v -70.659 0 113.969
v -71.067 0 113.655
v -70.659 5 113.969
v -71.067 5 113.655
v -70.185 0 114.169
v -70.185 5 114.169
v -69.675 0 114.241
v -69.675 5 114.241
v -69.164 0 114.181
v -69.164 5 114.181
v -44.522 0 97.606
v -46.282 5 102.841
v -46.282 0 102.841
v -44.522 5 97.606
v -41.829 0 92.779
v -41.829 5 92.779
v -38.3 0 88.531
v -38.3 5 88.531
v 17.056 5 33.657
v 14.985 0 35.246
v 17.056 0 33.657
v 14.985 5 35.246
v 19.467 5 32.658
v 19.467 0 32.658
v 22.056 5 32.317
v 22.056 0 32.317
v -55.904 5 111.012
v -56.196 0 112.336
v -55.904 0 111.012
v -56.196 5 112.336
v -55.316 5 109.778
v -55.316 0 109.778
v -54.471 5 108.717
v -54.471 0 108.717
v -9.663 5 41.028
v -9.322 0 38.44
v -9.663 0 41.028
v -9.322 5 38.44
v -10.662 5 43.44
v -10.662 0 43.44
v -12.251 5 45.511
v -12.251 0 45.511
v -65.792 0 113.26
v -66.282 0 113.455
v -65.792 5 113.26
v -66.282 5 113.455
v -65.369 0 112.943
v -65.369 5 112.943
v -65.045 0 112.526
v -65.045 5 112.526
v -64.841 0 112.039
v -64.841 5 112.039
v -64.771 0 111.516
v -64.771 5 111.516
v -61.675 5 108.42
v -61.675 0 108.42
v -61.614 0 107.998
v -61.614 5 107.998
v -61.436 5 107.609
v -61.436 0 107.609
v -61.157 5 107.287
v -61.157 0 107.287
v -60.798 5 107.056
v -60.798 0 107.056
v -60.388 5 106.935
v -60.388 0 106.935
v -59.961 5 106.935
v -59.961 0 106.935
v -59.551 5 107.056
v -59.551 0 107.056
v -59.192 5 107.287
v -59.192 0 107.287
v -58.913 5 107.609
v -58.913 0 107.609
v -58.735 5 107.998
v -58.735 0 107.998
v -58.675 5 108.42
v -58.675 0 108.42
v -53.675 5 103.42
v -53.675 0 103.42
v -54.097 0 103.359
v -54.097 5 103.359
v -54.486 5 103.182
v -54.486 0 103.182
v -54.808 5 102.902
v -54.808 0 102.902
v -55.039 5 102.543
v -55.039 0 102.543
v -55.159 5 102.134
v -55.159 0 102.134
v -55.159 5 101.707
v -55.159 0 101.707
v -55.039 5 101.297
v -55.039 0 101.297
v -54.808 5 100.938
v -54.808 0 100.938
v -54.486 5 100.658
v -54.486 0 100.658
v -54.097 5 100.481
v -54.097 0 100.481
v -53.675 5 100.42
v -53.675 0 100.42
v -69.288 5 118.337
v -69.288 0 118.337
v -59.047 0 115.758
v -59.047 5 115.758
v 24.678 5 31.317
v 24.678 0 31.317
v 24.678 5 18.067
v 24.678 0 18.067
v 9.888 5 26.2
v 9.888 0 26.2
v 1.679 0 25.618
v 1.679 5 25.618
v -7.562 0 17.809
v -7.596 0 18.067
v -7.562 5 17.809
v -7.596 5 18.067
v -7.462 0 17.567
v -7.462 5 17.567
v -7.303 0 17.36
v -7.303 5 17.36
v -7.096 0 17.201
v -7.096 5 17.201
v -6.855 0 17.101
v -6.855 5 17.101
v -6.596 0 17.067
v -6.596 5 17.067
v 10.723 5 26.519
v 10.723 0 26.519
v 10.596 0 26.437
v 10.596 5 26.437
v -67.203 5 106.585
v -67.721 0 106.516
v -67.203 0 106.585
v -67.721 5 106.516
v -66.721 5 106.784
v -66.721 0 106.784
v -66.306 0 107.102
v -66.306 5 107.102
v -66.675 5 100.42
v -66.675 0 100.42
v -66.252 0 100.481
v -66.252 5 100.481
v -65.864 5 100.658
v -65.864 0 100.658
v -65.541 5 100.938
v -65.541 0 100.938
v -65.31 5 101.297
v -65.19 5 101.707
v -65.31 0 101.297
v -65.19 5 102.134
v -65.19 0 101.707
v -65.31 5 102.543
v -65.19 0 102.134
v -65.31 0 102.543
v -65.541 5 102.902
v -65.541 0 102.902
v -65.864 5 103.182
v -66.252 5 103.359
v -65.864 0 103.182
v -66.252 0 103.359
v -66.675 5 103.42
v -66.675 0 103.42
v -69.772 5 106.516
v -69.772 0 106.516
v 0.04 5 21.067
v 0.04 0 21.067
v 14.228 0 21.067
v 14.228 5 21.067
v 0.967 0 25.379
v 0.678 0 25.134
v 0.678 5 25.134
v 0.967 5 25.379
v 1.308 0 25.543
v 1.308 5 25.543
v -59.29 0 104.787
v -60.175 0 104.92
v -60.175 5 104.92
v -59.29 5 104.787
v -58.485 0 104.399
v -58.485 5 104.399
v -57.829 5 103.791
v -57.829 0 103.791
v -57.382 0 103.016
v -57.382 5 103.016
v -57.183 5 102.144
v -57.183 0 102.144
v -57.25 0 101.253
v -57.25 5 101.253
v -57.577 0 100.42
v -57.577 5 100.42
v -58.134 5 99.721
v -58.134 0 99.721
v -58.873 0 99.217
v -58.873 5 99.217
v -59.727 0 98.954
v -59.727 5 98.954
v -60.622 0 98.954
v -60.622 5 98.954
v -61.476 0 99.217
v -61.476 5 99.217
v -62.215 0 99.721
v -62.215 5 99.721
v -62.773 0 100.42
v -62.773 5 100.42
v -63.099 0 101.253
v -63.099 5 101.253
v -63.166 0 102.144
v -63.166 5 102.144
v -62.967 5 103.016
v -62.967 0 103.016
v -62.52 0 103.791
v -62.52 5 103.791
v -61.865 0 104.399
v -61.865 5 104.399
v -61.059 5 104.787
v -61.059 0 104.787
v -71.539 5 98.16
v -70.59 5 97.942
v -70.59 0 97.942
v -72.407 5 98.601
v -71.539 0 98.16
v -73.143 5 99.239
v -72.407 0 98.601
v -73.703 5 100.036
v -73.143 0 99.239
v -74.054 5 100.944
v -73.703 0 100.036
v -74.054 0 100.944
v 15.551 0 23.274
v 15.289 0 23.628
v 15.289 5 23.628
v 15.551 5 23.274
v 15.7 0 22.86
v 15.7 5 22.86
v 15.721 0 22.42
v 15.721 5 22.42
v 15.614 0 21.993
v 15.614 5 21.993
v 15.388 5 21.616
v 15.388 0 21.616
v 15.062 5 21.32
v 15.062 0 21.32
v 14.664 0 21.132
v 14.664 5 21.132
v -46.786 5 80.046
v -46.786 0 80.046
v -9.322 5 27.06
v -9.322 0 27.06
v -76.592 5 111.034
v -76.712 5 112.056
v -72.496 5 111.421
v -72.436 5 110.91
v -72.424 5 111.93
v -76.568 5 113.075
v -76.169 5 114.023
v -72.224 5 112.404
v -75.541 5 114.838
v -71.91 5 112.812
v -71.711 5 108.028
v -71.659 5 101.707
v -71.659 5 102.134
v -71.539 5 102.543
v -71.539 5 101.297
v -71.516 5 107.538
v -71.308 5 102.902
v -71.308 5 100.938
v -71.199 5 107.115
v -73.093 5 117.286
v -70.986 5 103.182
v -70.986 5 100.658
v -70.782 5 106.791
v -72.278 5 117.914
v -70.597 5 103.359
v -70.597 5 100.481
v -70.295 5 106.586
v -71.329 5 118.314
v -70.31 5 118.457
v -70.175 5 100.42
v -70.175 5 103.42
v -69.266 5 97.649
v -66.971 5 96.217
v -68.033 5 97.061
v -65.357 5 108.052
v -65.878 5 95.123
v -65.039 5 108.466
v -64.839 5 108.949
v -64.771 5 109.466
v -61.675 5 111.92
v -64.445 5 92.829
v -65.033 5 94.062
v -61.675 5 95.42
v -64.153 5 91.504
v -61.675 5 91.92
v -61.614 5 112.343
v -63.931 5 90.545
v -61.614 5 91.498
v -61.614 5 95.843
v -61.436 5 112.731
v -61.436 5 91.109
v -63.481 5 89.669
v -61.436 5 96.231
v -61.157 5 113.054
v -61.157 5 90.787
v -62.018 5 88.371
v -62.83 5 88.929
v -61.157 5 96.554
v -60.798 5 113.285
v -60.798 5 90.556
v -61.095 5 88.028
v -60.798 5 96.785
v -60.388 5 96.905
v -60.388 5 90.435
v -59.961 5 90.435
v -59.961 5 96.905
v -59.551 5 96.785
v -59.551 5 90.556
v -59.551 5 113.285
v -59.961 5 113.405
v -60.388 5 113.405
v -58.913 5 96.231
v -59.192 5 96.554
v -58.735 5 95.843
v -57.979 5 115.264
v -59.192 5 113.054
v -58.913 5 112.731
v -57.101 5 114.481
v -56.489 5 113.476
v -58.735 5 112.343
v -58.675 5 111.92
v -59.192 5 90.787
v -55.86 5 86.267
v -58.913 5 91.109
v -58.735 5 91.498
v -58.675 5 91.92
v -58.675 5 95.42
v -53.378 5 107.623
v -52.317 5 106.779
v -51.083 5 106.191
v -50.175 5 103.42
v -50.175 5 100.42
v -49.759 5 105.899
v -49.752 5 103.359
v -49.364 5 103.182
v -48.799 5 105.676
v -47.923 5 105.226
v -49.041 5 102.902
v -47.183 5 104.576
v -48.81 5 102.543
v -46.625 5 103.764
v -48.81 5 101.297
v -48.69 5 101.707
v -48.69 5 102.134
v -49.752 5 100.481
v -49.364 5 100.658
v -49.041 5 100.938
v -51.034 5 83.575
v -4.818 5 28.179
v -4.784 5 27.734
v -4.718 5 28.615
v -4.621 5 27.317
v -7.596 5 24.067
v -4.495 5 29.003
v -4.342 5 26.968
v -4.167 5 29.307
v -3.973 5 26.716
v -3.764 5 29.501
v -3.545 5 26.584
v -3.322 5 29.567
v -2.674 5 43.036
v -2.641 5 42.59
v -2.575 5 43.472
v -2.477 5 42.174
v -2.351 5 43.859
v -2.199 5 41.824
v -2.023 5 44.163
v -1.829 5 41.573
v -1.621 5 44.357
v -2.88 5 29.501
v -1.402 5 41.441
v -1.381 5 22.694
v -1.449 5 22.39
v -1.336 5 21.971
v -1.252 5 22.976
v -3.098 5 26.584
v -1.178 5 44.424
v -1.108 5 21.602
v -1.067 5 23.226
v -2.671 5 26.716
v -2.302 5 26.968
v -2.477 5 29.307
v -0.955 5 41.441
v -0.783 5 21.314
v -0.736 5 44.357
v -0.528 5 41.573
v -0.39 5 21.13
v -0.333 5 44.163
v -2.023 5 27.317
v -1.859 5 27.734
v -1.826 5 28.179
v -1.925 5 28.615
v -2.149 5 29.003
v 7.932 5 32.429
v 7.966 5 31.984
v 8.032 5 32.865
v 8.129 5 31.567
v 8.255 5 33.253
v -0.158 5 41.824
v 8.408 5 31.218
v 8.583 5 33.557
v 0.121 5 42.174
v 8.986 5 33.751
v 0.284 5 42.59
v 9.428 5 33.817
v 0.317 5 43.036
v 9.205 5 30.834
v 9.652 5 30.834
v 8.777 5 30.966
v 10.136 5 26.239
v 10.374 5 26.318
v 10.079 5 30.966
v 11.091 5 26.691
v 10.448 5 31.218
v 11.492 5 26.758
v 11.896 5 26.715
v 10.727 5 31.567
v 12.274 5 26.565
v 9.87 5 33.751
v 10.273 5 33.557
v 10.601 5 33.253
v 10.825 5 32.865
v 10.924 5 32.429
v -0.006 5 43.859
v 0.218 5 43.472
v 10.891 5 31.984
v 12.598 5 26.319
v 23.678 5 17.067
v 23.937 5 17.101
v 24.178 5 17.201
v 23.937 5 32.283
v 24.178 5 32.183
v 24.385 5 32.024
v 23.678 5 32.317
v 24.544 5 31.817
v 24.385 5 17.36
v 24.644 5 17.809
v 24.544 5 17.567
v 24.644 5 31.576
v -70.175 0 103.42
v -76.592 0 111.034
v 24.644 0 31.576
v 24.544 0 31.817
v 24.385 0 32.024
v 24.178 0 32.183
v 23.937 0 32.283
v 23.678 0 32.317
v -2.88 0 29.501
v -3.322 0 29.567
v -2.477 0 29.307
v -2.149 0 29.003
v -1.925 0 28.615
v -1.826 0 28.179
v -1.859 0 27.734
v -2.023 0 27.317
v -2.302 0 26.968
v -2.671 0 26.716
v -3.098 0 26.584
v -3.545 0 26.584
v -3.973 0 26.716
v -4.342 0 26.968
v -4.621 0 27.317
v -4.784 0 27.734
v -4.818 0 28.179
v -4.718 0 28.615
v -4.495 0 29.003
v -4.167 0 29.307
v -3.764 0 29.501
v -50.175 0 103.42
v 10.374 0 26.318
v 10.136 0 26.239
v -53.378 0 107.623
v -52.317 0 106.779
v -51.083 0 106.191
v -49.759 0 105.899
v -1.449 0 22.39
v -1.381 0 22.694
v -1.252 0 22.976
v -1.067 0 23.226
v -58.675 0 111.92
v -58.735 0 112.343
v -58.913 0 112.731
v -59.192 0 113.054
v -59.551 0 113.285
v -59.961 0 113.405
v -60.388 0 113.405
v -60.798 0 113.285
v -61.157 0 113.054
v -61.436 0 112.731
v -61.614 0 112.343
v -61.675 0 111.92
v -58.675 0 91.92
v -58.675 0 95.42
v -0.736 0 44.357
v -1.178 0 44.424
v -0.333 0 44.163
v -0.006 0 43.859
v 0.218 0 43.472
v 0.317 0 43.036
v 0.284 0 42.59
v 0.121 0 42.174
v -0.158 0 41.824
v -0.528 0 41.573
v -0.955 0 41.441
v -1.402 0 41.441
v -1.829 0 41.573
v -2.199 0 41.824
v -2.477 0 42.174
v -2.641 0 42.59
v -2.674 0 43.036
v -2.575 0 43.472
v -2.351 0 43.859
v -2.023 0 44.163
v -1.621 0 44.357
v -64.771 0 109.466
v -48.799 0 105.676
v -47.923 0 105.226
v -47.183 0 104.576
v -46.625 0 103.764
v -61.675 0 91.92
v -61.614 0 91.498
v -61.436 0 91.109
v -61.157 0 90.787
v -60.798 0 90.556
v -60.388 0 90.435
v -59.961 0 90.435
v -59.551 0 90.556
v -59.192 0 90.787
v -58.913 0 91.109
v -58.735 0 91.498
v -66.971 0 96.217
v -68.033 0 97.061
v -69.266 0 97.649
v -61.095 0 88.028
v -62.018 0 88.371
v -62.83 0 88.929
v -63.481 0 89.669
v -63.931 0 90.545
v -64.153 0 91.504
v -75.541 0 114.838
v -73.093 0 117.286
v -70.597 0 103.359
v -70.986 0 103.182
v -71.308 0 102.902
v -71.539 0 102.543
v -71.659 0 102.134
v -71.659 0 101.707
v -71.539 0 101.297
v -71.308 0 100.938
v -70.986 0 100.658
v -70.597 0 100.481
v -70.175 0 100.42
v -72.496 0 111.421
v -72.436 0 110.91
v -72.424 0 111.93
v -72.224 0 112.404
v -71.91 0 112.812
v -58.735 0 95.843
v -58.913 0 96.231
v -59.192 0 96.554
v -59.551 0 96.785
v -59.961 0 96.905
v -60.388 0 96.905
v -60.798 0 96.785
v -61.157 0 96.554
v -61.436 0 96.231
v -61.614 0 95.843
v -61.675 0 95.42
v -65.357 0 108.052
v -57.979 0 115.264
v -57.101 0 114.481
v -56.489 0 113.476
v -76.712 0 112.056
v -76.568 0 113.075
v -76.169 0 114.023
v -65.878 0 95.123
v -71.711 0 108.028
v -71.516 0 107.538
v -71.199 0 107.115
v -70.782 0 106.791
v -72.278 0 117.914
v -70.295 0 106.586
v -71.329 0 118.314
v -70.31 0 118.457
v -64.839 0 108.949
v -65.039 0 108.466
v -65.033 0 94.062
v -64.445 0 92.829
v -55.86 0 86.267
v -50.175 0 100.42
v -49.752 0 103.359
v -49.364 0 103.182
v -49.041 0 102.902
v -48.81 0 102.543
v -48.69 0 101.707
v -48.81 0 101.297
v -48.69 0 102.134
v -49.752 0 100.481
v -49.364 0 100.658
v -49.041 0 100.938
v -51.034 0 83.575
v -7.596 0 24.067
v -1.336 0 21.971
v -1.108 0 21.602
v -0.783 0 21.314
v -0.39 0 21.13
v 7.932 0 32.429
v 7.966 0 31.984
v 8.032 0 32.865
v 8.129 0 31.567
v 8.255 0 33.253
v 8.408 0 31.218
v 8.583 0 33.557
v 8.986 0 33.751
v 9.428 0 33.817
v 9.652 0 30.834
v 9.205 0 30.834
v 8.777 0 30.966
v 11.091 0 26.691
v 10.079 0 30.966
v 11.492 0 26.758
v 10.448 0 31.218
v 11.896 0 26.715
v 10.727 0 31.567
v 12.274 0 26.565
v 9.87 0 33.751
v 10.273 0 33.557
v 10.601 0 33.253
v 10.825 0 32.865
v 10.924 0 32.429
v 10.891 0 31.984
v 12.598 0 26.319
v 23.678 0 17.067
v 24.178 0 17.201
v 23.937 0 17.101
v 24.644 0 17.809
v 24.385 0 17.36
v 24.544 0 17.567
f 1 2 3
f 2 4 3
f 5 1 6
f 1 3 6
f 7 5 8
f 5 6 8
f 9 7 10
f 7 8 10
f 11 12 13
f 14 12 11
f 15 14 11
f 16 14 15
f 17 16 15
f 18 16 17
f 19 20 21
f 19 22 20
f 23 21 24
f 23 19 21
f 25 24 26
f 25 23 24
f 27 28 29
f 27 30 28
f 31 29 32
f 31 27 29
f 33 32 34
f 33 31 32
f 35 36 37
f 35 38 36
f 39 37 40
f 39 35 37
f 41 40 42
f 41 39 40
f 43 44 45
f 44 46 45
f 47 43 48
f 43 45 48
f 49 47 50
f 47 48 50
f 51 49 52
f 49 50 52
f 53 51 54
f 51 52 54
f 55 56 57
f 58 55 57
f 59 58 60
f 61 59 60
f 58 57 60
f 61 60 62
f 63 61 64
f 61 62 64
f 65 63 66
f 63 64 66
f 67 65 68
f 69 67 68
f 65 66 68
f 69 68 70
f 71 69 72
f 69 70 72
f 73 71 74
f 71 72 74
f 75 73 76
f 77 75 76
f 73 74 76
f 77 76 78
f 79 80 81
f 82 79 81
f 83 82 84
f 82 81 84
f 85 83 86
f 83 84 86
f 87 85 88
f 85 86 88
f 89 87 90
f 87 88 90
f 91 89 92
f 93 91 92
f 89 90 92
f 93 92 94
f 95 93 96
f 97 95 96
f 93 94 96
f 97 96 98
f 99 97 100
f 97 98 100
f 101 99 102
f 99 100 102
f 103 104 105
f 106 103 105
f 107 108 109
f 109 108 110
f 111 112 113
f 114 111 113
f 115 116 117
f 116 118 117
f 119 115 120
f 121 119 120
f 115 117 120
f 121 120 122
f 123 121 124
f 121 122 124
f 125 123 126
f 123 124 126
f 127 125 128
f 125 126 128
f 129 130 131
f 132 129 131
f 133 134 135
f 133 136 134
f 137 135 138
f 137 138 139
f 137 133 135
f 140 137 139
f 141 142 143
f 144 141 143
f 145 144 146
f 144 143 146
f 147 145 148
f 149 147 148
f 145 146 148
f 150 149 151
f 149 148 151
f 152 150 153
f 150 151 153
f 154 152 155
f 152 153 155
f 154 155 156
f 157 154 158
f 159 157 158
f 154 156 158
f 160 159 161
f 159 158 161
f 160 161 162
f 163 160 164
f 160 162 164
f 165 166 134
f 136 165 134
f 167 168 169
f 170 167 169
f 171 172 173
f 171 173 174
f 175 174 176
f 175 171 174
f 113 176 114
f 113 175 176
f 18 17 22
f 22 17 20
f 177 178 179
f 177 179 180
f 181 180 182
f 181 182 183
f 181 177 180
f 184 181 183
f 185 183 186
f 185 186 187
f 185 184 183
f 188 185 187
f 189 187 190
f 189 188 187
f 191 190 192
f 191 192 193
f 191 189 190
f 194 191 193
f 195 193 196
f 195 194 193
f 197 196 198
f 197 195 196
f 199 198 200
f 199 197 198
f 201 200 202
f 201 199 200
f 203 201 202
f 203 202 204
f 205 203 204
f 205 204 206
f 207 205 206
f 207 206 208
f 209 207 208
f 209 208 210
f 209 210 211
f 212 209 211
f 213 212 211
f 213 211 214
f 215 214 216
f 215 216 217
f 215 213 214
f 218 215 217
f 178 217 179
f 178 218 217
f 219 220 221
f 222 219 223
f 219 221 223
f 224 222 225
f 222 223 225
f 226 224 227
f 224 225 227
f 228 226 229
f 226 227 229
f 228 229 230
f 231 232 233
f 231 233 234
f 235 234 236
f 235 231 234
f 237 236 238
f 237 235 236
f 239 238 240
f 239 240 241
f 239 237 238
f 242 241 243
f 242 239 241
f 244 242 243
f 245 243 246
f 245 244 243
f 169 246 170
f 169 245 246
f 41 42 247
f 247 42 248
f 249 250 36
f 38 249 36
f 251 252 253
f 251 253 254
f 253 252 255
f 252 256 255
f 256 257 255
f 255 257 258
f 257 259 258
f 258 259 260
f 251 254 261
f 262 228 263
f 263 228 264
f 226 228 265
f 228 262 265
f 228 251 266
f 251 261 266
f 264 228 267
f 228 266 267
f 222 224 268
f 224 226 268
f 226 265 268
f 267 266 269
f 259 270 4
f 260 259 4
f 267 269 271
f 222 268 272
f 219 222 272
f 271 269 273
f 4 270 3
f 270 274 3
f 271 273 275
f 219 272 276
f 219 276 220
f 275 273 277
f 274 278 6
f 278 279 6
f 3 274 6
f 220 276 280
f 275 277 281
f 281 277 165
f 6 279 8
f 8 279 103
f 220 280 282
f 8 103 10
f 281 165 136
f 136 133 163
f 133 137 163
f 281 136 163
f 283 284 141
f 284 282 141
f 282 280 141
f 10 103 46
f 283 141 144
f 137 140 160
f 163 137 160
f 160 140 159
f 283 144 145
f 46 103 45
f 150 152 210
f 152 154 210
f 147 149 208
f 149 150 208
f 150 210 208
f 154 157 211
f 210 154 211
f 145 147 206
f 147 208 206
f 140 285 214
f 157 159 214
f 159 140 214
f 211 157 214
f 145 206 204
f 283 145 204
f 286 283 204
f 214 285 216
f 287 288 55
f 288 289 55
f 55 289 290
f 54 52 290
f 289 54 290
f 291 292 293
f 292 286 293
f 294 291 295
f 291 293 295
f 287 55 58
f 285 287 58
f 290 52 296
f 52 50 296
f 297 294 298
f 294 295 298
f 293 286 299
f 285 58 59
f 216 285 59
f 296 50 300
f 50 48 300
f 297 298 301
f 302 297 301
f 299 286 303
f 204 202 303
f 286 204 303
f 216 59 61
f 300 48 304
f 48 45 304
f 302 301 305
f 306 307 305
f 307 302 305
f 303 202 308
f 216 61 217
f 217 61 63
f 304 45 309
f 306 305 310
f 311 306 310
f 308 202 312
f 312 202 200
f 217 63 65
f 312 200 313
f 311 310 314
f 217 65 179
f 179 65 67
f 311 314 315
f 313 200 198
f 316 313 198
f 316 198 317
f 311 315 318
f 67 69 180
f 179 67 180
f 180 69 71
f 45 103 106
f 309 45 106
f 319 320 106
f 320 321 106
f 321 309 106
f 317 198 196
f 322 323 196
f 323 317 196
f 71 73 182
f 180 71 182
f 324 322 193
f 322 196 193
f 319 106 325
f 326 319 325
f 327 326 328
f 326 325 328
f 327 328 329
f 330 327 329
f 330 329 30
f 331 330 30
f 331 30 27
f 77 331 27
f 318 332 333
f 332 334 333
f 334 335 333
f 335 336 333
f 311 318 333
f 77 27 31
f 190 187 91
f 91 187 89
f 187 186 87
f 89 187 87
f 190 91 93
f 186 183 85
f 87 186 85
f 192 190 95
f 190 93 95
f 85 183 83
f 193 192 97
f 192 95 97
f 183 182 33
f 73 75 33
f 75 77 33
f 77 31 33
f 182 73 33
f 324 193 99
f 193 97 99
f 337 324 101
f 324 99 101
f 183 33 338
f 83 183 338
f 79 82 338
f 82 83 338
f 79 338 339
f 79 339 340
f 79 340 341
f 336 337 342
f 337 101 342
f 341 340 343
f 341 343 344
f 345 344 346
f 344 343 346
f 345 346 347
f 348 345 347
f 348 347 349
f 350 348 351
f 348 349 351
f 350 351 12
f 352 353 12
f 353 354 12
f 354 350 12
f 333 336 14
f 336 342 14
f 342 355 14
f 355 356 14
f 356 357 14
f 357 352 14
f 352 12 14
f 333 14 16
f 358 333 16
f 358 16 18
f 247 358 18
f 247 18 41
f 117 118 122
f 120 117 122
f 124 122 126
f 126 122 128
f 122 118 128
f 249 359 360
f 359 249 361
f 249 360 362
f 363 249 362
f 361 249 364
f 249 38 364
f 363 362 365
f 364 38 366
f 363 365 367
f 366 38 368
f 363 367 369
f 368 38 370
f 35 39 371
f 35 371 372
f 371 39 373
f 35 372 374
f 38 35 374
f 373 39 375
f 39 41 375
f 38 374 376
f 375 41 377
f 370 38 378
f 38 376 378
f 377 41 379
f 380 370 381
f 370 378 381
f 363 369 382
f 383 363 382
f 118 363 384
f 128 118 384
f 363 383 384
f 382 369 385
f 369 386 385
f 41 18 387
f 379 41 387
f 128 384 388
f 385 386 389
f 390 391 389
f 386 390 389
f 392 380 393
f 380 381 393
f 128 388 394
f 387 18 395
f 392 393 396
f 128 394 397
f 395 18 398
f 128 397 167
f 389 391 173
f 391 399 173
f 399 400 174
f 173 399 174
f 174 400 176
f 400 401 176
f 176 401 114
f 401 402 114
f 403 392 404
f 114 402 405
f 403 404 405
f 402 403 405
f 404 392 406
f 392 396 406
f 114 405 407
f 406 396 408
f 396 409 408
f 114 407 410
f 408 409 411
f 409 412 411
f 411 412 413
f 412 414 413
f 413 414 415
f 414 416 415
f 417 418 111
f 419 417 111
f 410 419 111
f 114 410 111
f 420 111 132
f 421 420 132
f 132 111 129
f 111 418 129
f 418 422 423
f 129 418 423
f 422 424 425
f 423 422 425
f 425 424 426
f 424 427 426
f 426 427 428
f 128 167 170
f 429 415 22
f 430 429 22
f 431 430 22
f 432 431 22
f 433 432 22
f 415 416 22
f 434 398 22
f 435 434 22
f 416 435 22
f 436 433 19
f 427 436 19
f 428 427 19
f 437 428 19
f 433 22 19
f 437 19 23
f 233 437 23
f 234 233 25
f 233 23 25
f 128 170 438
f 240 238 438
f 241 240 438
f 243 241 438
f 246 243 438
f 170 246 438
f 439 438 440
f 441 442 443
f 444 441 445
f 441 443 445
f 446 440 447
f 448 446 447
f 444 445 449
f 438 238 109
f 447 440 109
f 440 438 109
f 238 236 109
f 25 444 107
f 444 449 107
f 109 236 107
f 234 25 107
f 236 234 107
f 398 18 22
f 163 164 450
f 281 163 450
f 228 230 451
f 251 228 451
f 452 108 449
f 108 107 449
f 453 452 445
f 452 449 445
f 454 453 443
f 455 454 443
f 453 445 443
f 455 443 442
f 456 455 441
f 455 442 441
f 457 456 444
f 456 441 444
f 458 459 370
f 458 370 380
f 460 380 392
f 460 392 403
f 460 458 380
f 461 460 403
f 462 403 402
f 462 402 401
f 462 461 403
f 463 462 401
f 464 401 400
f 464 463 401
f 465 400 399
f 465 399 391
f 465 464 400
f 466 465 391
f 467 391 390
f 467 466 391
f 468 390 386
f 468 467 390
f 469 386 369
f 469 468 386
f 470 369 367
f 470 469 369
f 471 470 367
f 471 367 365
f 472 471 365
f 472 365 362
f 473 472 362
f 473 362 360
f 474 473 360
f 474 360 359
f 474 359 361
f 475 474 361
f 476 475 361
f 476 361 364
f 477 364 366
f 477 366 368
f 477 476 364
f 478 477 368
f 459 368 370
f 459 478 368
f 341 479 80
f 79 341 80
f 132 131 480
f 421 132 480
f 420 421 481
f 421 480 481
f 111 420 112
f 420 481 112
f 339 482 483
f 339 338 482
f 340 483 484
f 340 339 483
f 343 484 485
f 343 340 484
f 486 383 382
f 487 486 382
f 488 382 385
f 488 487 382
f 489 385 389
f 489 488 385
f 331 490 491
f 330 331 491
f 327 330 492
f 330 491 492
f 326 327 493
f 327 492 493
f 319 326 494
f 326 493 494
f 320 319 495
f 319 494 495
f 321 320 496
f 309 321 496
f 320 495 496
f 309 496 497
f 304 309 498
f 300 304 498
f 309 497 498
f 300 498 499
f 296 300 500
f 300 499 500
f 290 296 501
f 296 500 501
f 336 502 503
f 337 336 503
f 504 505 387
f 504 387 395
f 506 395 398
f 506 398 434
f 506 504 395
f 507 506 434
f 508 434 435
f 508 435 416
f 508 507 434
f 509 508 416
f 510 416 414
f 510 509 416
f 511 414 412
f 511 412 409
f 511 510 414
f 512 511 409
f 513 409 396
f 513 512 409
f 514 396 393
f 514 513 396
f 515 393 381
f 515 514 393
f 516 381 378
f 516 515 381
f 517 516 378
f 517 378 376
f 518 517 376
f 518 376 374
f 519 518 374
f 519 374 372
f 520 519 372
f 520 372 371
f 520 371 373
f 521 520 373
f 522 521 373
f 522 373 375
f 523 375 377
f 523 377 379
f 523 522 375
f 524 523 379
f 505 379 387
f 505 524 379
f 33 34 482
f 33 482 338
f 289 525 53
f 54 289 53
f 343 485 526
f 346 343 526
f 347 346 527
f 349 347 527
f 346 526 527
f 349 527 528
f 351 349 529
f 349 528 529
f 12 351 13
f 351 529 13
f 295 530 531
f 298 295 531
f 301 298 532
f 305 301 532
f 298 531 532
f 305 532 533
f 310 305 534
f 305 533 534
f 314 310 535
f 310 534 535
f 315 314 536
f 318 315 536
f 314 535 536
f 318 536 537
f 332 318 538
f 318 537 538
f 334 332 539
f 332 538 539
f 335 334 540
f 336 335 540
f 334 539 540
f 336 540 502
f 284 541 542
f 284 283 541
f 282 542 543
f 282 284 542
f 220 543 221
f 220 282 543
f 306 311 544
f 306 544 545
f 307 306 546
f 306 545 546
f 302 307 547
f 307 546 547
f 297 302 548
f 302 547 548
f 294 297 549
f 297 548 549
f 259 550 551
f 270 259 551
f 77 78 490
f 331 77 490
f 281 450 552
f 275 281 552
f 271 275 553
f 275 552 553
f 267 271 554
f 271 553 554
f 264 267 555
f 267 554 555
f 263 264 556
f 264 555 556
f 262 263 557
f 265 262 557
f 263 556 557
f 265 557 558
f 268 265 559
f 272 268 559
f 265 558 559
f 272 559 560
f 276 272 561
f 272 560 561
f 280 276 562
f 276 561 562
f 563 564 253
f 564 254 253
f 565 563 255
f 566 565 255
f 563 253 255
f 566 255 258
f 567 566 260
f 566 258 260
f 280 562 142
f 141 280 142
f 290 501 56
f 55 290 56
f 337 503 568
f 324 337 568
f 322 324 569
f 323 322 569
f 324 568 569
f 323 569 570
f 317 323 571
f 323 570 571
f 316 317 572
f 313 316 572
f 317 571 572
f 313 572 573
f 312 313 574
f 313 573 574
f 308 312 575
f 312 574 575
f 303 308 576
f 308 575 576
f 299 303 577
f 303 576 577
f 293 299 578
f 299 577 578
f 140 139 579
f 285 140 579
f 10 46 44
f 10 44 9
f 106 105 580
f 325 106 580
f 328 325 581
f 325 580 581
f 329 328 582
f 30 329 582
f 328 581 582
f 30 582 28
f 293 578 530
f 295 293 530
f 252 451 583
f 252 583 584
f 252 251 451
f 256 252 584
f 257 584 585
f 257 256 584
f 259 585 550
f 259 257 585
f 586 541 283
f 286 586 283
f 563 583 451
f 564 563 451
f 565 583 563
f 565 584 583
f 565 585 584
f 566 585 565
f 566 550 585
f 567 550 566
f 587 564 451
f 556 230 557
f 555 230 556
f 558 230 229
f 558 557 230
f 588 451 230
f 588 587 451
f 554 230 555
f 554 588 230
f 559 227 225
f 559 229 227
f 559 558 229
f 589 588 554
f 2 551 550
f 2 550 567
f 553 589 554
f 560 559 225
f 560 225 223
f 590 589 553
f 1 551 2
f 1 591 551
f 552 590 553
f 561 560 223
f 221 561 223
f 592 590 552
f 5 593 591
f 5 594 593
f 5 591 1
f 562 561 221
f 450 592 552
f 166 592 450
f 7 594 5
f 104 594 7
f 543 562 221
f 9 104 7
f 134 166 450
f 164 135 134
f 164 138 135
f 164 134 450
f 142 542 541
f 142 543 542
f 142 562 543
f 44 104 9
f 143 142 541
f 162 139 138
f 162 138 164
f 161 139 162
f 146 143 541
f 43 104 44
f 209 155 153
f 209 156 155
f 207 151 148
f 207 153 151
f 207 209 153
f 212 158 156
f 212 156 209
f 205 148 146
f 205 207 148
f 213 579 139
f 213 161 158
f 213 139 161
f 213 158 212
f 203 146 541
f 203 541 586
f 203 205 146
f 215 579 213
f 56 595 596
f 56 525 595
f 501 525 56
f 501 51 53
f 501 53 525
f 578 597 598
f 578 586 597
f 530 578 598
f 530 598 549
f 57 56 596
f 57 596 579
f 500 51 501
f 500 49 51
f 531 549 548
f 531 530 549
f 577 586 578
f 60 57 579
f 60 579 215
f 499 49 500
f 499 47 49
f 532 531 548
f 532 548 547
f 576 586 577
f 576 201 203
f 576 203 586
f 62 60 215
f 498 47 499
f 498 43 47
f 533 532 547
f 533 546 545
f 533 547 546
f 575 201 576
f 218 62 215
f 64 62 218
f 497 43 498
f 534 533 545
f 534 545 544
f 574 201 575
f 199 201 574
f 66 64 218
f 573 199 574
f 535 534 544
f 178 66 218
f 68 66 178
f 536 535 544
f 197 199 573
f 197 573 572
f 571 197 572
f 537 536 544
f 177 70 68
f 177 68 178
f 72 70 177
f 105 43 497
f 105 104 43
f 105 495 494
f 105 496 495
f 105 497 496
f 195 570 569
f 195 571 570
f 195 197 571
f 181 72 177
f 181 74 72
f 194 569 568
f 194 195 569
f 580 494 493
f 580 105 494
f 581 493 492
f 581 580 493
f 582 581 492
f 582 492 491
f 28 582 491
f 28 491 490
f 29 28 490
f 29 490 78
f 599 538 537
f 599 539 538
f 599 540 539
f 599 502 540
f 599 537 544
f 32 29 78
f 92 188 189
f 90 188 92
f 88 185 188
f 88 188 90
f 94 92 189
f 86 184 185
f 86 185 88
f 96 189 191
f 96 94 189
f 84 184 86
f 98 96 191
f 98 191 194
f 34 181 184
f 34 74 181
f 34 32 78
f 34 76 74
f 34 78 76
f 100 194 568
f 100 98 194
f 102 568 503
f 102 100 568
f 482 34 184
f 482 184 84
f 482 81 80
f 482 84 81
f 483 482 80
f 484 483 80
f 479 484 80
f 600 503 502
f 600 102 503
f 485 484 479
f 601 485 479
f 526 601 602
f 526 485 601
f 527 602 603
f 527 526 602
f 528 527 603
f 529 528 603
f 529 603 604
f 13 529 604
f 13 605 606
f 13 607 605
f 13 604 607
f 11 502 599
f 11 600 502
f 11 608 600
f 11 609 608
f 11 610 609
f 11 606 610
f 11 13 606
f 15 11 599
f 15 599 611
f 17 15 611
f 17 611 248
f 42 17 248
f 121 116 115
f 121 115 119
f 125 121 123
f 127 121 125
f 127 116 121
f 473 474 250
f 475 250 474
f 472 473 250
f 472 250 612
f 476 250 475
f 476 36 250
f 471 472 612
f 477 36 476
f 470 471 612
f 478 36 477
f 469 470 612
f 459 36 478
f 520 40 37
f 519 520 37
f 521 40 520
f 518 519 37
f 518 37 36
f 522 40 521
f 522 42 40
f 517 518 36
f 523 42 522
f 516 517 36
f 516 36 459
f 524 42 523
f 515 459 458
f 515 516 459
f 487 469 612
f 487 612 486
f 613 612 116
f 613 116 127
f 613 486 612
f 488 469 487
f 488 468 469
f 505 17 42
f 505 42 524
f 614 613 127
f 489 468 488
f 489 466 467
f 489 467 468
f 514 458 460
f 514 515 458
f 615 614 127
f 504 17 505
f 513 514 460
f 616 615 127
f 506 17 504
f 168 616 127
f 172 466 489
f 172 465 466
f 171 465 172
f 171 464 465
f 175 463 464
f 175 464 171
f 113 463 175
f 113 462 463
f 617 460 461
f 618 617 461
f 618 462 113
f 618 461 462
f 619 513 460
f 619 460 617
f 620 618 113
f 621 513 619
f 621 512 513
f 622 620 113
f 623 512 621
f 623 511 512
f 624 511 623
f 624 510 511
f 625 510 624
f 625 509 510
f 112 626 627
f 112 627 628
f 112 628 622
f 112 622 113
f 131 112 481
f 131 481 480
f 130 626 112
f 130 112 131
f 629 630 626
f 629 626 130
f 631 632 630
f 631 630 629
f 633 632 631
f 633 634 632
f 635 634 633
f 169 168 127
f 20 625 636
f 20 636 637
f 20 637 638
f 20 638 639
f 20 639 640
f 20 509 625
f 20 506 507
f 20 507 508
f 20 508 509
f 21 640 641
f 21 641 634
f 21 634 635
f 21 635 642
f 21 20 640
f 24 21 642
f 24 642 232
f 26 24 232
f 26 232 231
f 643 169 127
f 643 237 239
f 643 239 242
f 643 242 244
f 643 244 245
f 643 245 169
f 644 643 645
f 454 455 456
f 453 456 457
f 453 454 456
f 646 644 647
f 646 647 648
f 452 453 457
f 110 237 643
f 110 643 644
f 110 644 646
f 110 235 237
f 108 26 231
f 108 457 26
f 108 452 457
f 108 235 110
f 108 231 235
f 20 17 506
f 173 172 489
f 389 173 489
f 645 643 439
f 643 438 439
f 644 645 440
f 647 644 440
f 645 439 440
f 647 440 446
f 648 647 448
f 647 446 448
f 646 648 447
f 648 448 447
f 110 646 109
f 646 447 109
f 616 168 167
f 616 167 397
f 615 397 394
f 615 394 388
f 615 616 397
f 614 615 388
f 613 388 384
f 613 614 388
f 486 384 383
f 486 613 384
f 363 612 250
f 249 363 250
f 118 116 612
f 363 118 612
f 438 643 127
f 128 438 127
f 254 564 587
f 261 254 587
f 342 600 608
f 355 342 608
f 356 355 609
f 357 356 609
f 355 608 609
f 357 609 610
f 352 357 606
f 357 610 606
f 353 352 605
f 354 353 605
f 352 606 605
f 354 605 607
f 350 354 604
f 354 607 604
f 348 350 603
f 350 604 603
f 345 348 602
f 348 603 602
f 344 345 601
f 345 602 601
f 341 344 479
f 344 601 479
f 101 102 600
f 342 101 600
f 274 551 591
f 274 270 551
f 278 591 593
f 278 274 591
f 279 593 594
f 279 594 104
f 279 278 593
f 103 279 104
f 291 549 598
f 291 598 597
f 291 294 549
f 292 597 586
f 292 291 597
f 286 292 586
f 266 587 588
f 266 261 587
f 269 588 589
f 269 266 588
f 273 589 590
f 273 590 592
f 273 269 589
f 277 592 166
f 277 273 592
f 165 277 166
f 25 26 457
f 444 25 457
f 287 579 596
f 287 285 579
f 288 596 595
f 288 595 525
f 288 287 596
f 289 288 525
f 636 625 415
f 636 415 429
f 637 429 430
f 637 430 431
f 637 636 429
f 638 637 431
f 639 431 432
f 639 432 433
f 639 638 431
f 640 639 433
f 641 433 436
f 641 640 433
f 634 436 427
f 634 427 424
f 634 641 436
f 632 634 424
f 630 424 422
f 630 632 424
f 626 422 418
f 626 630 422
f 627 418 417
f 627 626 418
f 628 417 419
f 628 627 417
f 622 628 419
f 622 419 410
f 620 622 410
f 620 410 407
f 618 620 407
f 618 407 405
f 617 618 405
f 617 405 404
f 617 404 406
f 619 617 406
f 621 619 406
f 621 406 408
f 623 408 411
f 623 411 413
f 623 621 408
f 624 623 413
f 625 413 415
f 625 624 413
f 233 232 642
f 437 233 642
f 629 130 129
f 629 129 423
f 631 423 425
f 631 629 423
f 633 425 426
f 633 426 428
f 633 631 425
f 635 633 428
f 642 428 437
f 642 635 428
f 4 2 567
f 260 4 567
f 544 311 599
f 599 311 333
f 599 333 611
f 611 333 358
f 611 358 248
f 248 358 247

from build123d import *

# Parameters (mm, degrees)
SKETCH2_R           = 3.0000000000000018
SKETCH2_R_2         = 1.4999999999993736
SKETCH2_R_3         = 1.5000000000000009
SKETCH2_R_4         = 1.4999999999993723
BOSS_EXTRUDE1_DEPTH = 5
FILLET1_R           = 1.5
FILLET3_R           = 10
FILLET5_R           = 10
CHAMFER1_SIZE       = 4.5
FILLET6_R           = 6
FILLET7_R           = 4
FILLET8_R           = 2
FILLET9_R           = 30
FILLET10_R          = 1


with BuildPart() as part:
    # Sketch2 → Boss-Extrude1 (new body)
    with BuildSketch(Plane(origin=(0, 0, 0), x_dir=(1, 0, 0), z_dir=(0, 1, 0))):
        with BuildLine():
            Line((-46.189355852298796, -96.42025186017804), (-39.496927389393186, -89.72782339727232))
            Line((-39.496927389393186, -89.72782339727232), (17.913506363615255, -32.31738964426288))
            Line((17.913506363615255, -32.31738964426288), (24.678224989376695, -32.31738964426288))
            Line((24.678224989376695, -32.31738964426288), (24.678224989376428, -17.06738964426295))
            Line((24.678224989376428, -17.06738964426295), (-7.595965049770856, -17.06738964426337))
            Line((-7.595965049770856, -17.06738964426337), (-7.595965049770857, -24.067389644263372))
            Line((-7.595965049770857, -24.067389644263372), (-9.321775010623746, -27.06012368042446))
            Line((-9.321775010623746, -27.06012368042446), (-9.32177501062375, -37.06738964426337))
            Line((-9.32177501062375, -37.06738964426337), (-9.321775010623757, -42.58210827002507))
            Line((-9.321775010623753, -42.58210827002507), (-54.6598701272448, -87.9202033866469))
            Line((-54.6598701272448, -87.9202033866469), (-60.17458875300816, -87.92020338664692))
            ThreePointArc((-60.17458875300816, -87.92020338664692), (-63.00301587775435, -89.09177626190073), (-64.17458875300817, -91.92020338664692))
            Line((-64.17458875300817, -91.92020338664692), (-64.17458875300817, -97.92020338664689))
            Line((-64.17458875300817, -97.92020338664689), (-70.17458875301077, -97.92020338664689))
            ThreePointArc((-70.17458875301077, -97.92020338664689), (-72.6339398041774, -98.76558892412923), (-74.05374095021992, -100.9444071830841))
            Line((-74.05374095021992, -100.9444071830841), (-77.14515150148509, -113.23391188563446))
            Line((-77.14515150148509, -113.23391188563446), (-71.4882972519927, -118.89076613512684))
            Line((-71.4882972519927, -118.89076613512684), (-59.047429208957894, -115.75810794021132))
            ThreePointArc((-59.047429208957894, -115.75810794021132), (-56.9723521770992, -114.3172183869977), (-56.174588753010745, -111.92020338664949))
            Line((-56.174588753010745, -111.92020338664949), (-56.174588753010745, -105.92020338664949))
            Line((-56.174588753010745, -105.92020338664949), (-50.174588753008145, -105.92020338664949))
            ThreePointArc((-50.174588753008145, -105.92020338664949), (-47.34616162826196, -104.74863051139567), (-46.174588753008145, -101.92020338664949))
            Line((-46.174588753008145, -101.92020338664949), (-46.17464642427909, -101.89872393503671))
            Line((-46.17464642427909, -101.89872393503671), (-46.189355852298796, -96.42025186017804))
        make_face()
        Polygon((-70.26446914062754, -114.4577399969996), (-72.71257361922765, -112.00963551839949), (-71.33075600396296, -106.51639746436214), (-66.89210317428027, -106.51639746436214), (-64.77078283072062, -108.63771780792177), (-64.7707828307206, -113.0744087552009), align=None, mode=Mode.SUBTRACT)
        with BuildLine():
            ThreePointArc((-61.67458875301074, -108.42020338664949), (-60.17458875301075, -106.92020338664949), (-58.67458875301077, -108.42020338664949))
            Line((-58.67458875301077, -108.42020338664949), (-58.674588753010774, -111.92020338664949))
            ThreePointArc((-58.674588753010774, -111.92020338664949), (-60.17458875301075, -113.42020338664946), (-61.67458875301073, -111.92020338664949))
            Line((-61.67458875301073, -111.92020338664949), (-61.67458875301074, -108.42020338664949))
        make_face(mode=Mode.SUBTRACT)
        with BuildLine():
            ThreePointArc((-66.67458875301074, -100.42020338664692), (-65.17458875301071, -101.92020338664692), (-66.67458875301074, -103.42020338664692))
            Line((-66.67458875301074, -103.42020338664692), (-70.17458875301077, -103.42020338664692))
            ThreePointArc((-70.17458875301077, -103.42020338664692), (-71.67458875301075, -101.92020338664692), (-70.17458875301077, -100.42020338664692))
            Line((-70.17458875301077, -100.4202033866469), (-66.67458875301074, -100.4202033866469))
        make_face(mode=Mode.SUBTRACT)
        with Locations(Location((-60.174588753008145, -101.92020338664949, 0), (0, 0, 270))):
            Circle(SKETCH2_R, mode=Mode.SUBTRACT)
        with BuildLine():
            ThreePointArc((-53.67458875300815, -103.42020338664949), (-55.17458875300815, -101.92020338664949), (-53.67458875300815, -100.42020338664949))
            Line((-53.67458875300815, -100.42020338664949), (-50.174588753008145, -100.42020338664949))
            ThreePointArc((-50.174588753008145, -100.42020338664949), (-48.67458875300816, -101.92020338664949), (-50.174588753008145, -103.42020338664949))
            Line((-50.174588753008145, -103.42020338664949), (-53.67458875300815, -103.42020338664949))
        make_face(mode=Mode.SUBTRACT)
        with BuildLine():
            ThreePointArc((-58.67458875300815, -95.42020338664692), (-60.17458875300815, -96.9202033866469), (-61.67458875300815, -95.42020338664692))
            Line((-61.674588753008145, -95.42020338664692), (-61.67458875300816, -91.92020338664692))
            ThreePointArc((-61.67458875300816, -91.92020338664692), (-60.174588753008145, -90.42020338664689), (-58.67458875300813, -91.92020338664692))
            Line((-58.67458875300813, -91.92020338664692), (-58.674588753008145, -95.42020338664692))
        make_face(mode=Mode.SUBTRACT)
        with Locations(Location((-1.1783767284213562, -42.92399136206118, 0), (0, 0, 270))):
            Circle(SKETCH2_R_2, mode=Mode.SUBTRACT)
        with Locations(Location((-3.3217750106237407, -28.067389644263372, 0), (0, 0, 270))):
            Circle(SKETCH2_R_3, mode=Mode.SUBTRACT)
        with Locations(Location((9.428224989376764, -32.31738964426288, 0), (0, 0, 270))):
            Circle(SKETCH2_R_4, mode=Mode.SUBTRACT)
        Polygon((1.0820753752795897, -25.575281589539195), (-1.459873180493811, -22.79599601598655), (-1.4598731804937872, -21.06738964426295), (17.849797864630506, -21.06738964426295), (11.740910030340089, -27.17627747855337), (10.272484798754686, -26.22755837455273), align=None, mode=Mode.SUBTRACT)
    extrude(amount=BOSS_EXTRUDE1_DEPTH)

    # Fillet1
    # the kernel refuses this fillet: 1.5 mm, written as the material it adds along each edge
    with BuildSketch(Plane(origin=(1.0820753752795897, 0, 25.575281589539195), x_dir=(0.9974908468725838, 0, 0.07079555357093803), z_dir=(0, 1, 0))) as fillet1_piece_1:
        with BuildLine():
            CenterArc((FILLET1_R * 0.398900109333, FILLET1_R), FILLET1_R, 226.50587582859146, 43.4941241714086)
            Line((-FILLET1_R * 0.289380073746, FILLET1_R * 0.274555040282), (0, 0))
            Line((0, 0), (FILLET1_R * 0.398900109333, 0))
        make_face()
    extrude(amount=5)
    with BuildSketch(Plane(origin=(-1.459873180493811, 0, 22.79599601598655), x_dir=(1.372e-14, 0, -1), z_dir=(0, 1, 0))) as fillet1_piece_2:
        with BuildLine():
            CenterArc((FILLET1_R * 0.388338270451, -FILLET1_R), FILLET1_R, 89.99999999999997, 42.44619337739144)
            Line((-FILLET1_R * 0.286559260205, -FILLET1_R * 0.262088539786), (0, 0))
            Line((0, 0), (FILLET1_R * 0.388338270451, 0))
        make_face()
    extrude(amount=5)
    with BuildSketch(Plane(origin=(-1.459873180493787, 0, 21.06738964426295), x_dir=(1, 0, 0), z_dir=(0, 1, 0))) as fillet1_piece_3:
        with BuildLine():
            CenterArc((FILLET1_R, -FILLET1_R), FILLET1_R, 90, 89.99999999999918)
            Line((-2.087e-14, -FILLET1_R), (0, 0))
            Line((0, 0), (FILLET1_R, 0))
        make_face()
    extrude(amount=5)
    with BuildSketch(Plane(origin=(11.740910030340089, 0, 27.17627747855337), x_dir=(-0.839945220222329, 0, -0.5426711960530642), z_dir=(0, 1, 0))) as fillet1_piece_4:
        with BuildLine():
            CenterArc((FILLET1_R * 0.807844840446, -FILLET1_R), FILLET1_R, 89.99999999999994, 77.86566453571226)
            Line((-FILLET1_R * 0.169812603282, -FILLET1_R * 0.789795521639), (0, 0))
            Line((0, 0), (FILLET1_R * 0.807844840446, -3e-17))
        make_face()
    extrude(amount=5)
    with BuildSketch(Plane(origin=(17.849797864630506, 0, 21.06738964426295), x_dir=(-0.7071067811865475, 0, 0.7071067811865475), z_dir=(0, 1, 0))) as fillet1_piece_5:
        with BuildLine():
            CenterArc((FILLET1_R * 2.41421356237, -FILLET1_R), FILLET1_R, 89.99999999999994, 135.00000000000006)
            Line((FILLET1_R * 1.70710678119, -FILLET1_R * 1.70710678119), (0, 0))
            Line((0, 0), (FILLET1_R * 2.41421356237, 1e-17))
        make_face()
    extrude(amount=5)
    # the kernel refuses this fillet: 1.5 mm, written as the material it takes off along each edge
    with BuildSketch(Plane(origin=(10.27248479875469, -0.9630450228974294, 26.22755837455273), x_dir=(0.8399452202223279, 0, 0.5426711960530661), z_dir=(0, 1, 0))) as fillet1_2_piece_1:
        with BuildLine():
            CenterArc((FILLET1_R * 0.256812006106, -FILLET1_R), FILLET1_R, 90.00000000000006, 28.805982084511456)
            Line((-FILLET1_R * 0.225033157983, -FILLET1_R * 0.123743623222), (0, 0))
            Line((0, 0), (FILLET1_R * 0.256812006106, 2e-17))
        make_face()
    extrude(amount=6.92609004579486, mode=Mode.SUBTRACT)

    # Fillet3
    fillet3_edges = [part.edges().sort_by_distance(p)[0] for p in [
        (17.913506363615255, 2.5, 32.31738964426288),
    ]]
    fillet(fillet3_edges, radius=FILLET3_R)

    # Fillet5
    fillet5_edges = [part.edges().sort_by_distance(p)[0] for p in [
        (-9.321775010623755, 2.5, 42.58210827002507),
    ]]
    fillet(fillet5_edges, radius=FILLET5_R)

    # Chamfer1
    chamfer1_edges = [part.edges().sort_by_distance(p)[0] for p in [
        (-64.17458875300817, 2.5, 97.92020338664689),
        (-56.174588753010745, 2.5, 105.92020338664949),
    ]]
    chamfer(chamfer1_edges, length=CHAMFER1_SIZE)

    # Fillet6
    fillet6_edges = [part.edges().sort_by_distance(p)[0] for p in [
        (-64.17458875300817, 2.5, 93.42020338664689),
        (-68.67458875300817, 2.5, 97.92020338664689),
        (-56.174588753010745, 2.5, 110.42020338664949),
        (-51.674588753010745, 2.5, 105.92020338664949),
    ]]
    fillet(fillet6_edges, radius=FILLET6_R)

    # Fillet7
    fillet7_edges = [part.edges().sort_by_distance(p)[0] for p in [
        (-71.4882972519927, 2.5, 118.89076613512684),
        (-77.14515150148509, 2.5, 113.23391188563446),
    ]]
    fillet(fillet7_edges, radius=FILLET7_R)

    # Fillet8
    fillet8_edges = [part.edges().sort_by_distance(p)[0] for p in [
        (-72.71257361922765, 2.5, 112.00963551839949),
        (-70.26446914062754, 2.5, 114.4577399969996),
        (-64.7707828307206, 2.5, 113.0744087552009),
        (-64.77078283072062, 2.5, 108.63771780792177),
        (-66.89210317428027, 2.5, 106.51639746436214),
        (-71.33075600396296, 2.5, 106.51639746436214),
    ]]
    fillet(fillet8_edges, radius=FILLET8_R)

    # Fillet9
    fillet9_edges = [part.edges().sort_by_distance(p)[0] for p in [
        (-54.6598701272448, 2.5, 87.9202033866469),
        (-46.189355852298796, 2.5, 96.42025186017804),
    ]]
    fillet(fillet9_edges, radius=FILLET9_R)

    # Fillet10
    fillet10_edges = [part.edges().sort_by_distance(p)[0] for p in [
        (-7.595965049770856, 2.5, 17.06738964426337),
        (24.678224989376428, 2.5, 17.06738964426295),
        (24.678224989376695, 2.5, 32.31738964426288),
    ]]
    fillet(fillet10_edges, radius=FILLET10_R)


solid = part.part
